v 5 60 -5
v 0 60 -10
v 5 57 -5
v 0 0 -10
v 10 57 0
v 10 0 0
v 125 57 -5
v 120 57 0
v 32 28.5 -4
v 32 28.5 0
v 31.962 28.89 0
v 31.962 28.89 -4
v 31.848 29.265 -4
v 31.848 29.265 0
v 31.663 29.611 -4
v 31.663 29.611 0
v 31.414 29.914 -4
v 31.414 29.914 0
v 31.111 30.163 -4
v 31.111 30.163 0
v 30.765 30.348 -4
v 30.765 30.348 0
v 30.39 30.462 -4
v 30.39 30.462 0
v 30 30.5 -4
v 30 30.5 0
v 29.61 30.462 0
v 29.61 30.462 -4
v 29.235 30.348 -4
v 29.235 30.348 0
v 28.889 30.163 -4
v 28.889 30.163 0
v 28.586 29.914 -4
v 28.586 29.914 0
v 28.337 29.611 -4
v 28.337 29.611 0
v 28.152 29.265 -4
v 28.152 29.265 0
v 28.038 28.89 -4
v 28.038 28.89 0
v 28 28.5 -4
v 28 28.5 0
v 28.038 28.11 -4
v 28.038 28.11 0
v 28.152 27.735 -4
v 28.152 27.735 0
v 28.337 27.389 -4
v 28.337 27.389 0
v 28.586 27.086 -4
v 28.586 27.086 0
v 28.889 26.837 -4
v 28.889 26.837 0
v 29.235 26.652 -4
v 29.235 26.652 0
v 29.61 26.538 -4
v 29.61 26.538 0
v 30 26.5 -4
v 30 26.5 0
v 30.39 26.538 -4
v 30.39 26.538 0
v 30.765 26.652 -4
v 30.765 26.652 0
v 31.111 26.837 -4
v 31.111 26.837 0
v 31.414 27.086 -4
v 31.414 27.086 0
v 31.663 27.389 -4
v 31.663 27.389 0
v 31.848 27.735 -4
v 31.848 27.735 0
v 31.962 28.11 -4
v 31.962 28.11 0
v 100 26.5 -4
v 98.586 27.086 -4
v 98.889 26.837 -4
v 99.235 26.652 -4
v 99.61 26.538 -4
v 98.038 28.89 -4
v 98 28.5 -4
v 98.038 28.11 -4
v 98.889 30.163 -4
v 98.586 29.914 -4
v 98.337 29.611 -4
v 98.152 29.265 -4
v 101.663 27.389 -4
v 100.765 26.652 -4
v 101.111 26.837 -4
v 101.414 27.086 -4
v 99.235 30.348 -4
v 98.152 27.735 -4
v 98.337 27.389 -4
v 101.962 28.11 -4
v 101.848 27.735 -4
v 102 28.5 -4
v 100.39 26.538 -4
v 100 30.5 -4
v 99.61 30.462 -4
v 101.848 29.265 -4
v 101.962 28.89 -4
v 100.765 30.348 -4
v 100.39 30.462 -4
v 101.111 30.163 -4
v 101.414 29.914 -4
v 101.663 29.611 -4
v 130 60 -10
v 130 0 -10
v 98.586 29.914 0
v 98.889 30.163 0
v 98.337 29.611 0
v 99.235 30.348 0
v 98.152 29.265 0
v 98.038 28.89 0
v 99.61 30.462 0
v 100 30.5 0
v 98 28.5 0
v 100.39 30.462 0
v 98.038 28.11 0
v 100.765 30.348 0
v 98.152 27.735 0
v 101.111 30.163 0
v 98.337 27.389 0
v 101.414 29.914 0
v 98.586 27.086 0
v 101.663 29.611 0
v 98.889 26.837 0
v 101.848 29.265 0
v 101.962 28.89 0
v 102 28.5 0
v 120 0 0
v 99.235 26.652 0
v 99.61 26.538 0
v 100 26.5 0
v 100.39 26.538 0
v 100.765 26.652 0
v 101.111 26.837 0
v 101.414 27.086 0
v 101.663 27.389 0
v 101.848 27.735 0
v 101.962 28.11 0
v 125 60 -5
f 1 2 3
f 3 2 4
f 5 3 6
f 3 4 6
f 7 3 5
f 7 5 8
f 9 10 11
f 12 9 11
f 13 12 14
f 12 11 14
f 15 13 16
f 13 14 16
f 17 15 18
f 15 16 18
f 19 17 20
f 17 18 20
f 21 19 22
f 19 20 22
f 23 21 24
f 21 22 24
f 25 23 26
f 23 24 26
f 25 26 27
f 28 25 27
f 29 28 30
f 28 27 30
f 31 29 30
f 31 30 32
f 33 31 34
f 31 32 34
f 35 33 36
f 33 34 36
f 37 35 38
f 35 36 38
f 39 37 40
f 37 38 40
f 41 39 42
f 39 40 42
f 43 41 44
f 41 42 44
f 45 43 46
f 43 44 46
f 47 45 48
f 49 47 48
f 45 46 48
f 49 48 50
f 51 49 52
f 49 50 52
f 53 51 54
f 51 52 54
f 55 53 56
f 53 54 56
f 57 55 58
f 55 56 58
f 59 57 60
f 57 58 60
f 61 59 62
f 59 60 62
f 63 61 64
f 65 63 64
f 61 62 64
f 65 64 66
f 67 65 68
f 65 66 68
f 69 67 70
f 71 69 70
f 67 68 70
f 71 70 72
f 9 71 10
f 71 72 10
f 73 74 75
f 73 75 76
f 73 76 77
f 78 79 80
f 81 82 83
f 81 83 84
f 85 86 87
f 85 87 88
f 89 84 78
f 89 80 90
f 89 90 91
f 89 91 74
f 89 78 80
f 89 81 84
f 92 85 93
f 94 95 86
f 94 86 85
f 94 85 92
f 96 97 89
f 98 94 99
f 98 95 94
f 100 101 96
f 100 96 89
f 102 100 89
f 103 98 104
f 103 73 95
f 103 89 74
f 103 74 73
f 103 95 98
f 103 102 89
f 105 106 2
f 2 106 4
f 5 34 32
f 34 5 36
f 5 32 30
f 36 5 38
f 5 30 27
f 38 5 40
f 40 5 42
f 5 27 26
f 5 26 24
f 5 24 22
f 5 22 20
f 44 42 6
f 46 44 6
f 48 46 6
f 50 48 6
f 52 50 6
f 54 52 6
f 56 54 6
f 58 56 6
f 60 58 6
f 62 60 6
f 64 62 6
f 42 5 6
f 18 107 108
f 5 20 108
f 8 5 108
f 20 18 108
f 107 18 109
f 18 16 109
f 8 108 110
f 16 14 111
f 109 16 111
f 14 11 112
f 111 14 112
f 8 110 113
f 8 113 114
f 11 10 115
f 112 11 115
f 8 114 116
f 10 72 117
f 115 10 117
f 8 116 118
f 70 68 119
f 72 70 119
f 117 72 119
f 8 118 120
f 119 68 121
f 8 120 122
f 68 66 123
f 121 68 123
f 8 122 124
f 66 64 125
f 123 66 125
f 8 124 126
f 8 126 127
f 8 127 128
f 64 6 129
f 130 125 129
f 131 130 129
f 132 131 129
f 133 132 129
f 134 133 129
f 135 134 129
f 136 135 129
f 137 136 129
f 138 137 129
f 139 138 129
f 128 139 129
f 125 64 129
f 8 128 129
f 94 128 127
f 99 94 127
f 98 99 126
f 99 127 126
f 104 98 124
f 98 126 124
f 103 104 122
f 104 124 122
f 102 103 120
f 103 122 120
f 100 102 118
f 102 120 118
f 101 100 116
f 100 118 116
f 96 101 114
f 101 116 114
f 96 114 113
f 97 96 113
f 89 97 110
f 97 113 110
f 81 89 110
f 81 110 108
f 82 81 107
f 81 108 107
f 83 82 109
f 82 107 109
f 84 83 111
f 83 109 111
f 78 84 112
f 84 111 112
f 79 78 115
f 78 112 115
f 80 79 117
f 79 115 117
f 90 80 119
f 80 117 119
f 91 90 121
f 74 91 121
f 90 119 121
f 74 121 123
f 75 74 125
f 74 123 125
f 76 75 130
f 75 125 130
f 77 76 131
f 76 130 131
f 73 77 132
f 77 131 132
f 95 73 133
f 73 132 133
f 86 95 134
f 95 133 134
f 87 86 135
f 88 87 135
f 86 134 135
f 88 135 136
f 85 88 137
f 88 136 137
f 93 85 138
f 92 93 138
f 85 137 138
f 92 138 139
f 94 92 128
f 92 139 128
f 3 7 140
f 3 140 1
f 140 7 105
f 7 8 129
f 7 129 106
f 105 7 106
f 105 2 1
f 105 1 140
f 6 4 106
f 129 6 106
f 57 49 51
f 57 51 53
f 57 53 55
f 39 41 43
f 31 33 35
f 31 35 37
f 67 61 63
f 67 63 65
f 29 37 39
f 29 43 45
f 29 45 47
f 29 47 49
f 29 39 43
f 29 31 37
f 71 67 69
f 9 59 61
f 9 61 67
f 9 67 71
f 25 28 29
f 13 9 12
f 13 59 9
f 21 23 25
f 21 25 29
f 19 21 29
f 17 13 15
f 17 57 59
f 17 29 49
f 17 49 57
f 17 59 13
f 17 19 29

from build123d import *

# Parameters (mm, degrees)
BOSS_EXTRUDE1_DEPTH     = 60
CUT_EXTRUDE1_DEPTH      = 144.527000944
CUT_EXTRUDE1_DEPTH_BACK = 3
SKETCH3_R               = 2
CUT_EXTRUDE2_DEPTH      = 4


with BuildPart() as part:
    # Sketch1 → Boss-Extrude1 (new body)
    with BuildSketch(Plane(origin=(0, 0, 0), x_dir=(1, 0, 0), z_dir=(0, 1, 0))):
        Polygon((130, 10), (0, 10), (10, 0), (120, 0), align=None)
    extrude(amount=BOSS_EXTRUDE1_DEPTH)

    # Sketch2 → Cut-Extrude1 (cut, two sides: drawn at the far end of the back side and taken through both)
    with BuildSketch(Plane(origin=(0, 60, 0), x_dir=(1, 0, 0), z_dir=(0, 1, 0)).offset(-CUT_EXTRUDE1_DEPTH_BACK)):
        Polygon((125, 5), (5, 5), (10, 0), (120, 0), align=None)
    extrude(amount=CUT_EXTRUDE1_DEPTH + CUT_EXTRUDE1_DEPTH_BACK, mode=Mode.SUBTRACT)

    # Sketch3 → Cut-Extrude2 (cut)
    with BuildSketch(Plane.XY):
        with Locations((30, 28.5)):
            Circle(SKETCH3_R)
        with Locations((100, 28.5)):
            Circle(SKETCH3_R)
    extrude(amount=-CUT_EXTRUDE2_DEPTH, mode=Mode.SUBTRACT)


solid = part.part
